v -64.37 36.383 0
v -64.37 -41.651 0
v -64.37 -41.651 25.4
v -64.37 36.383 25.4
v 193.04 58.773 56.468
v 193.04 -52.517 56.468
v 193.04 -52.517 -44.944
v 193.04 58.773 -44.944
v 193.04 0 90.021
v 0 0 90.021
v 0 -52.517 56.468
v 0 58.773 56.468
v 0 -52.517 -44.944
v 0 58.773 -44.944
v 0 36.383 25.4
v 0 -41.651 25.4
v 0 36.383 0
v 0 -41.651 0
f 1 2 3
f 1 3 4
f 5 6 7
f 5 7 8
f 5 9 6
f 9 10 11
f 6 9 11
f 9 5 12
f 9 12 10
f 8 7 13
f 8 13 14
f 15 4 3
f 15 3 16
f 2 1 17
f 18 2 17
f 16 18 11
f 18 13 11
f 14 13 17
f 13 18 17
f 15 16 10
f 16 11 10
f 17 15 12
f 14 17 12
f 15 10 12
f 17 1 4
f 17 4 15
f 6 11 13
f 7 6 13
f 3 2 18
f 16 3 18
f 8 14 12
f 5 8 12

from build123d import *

# Parameters (mm, degrees)
F1_DEPTH = 193.04
F2_W     = 122.8137016296
F2_H     = 78.0344456434
F3_DEPTH = 25.4


# Not quite as in the source:
# - a feature names something its author has since deleted; it is built from what else it names


with BuildPart() as f1:
    # F0 (on Right) → F1 (new body)
    with BuildSketch(Plane.YZ):
        Polygon((-52.5168515742, 56.4679652452), (-52.5168515742, -44.9438914657), (58.7727762759, -44.9438914657), (58.7727762759, 56.4679652452), (0, 90.0208726525), align=None)
    extrude(amount=F1_DEPTH)

    # F2 (on Top) → F3 (join)
    with BuildSketch(Plane.XY):
        with Locations((-2.963334322, -2.6340745389)):
            Rectangle(F2_W, F2_H)
    extrude(amount=F3_DEPTH)


solid = f1.part
